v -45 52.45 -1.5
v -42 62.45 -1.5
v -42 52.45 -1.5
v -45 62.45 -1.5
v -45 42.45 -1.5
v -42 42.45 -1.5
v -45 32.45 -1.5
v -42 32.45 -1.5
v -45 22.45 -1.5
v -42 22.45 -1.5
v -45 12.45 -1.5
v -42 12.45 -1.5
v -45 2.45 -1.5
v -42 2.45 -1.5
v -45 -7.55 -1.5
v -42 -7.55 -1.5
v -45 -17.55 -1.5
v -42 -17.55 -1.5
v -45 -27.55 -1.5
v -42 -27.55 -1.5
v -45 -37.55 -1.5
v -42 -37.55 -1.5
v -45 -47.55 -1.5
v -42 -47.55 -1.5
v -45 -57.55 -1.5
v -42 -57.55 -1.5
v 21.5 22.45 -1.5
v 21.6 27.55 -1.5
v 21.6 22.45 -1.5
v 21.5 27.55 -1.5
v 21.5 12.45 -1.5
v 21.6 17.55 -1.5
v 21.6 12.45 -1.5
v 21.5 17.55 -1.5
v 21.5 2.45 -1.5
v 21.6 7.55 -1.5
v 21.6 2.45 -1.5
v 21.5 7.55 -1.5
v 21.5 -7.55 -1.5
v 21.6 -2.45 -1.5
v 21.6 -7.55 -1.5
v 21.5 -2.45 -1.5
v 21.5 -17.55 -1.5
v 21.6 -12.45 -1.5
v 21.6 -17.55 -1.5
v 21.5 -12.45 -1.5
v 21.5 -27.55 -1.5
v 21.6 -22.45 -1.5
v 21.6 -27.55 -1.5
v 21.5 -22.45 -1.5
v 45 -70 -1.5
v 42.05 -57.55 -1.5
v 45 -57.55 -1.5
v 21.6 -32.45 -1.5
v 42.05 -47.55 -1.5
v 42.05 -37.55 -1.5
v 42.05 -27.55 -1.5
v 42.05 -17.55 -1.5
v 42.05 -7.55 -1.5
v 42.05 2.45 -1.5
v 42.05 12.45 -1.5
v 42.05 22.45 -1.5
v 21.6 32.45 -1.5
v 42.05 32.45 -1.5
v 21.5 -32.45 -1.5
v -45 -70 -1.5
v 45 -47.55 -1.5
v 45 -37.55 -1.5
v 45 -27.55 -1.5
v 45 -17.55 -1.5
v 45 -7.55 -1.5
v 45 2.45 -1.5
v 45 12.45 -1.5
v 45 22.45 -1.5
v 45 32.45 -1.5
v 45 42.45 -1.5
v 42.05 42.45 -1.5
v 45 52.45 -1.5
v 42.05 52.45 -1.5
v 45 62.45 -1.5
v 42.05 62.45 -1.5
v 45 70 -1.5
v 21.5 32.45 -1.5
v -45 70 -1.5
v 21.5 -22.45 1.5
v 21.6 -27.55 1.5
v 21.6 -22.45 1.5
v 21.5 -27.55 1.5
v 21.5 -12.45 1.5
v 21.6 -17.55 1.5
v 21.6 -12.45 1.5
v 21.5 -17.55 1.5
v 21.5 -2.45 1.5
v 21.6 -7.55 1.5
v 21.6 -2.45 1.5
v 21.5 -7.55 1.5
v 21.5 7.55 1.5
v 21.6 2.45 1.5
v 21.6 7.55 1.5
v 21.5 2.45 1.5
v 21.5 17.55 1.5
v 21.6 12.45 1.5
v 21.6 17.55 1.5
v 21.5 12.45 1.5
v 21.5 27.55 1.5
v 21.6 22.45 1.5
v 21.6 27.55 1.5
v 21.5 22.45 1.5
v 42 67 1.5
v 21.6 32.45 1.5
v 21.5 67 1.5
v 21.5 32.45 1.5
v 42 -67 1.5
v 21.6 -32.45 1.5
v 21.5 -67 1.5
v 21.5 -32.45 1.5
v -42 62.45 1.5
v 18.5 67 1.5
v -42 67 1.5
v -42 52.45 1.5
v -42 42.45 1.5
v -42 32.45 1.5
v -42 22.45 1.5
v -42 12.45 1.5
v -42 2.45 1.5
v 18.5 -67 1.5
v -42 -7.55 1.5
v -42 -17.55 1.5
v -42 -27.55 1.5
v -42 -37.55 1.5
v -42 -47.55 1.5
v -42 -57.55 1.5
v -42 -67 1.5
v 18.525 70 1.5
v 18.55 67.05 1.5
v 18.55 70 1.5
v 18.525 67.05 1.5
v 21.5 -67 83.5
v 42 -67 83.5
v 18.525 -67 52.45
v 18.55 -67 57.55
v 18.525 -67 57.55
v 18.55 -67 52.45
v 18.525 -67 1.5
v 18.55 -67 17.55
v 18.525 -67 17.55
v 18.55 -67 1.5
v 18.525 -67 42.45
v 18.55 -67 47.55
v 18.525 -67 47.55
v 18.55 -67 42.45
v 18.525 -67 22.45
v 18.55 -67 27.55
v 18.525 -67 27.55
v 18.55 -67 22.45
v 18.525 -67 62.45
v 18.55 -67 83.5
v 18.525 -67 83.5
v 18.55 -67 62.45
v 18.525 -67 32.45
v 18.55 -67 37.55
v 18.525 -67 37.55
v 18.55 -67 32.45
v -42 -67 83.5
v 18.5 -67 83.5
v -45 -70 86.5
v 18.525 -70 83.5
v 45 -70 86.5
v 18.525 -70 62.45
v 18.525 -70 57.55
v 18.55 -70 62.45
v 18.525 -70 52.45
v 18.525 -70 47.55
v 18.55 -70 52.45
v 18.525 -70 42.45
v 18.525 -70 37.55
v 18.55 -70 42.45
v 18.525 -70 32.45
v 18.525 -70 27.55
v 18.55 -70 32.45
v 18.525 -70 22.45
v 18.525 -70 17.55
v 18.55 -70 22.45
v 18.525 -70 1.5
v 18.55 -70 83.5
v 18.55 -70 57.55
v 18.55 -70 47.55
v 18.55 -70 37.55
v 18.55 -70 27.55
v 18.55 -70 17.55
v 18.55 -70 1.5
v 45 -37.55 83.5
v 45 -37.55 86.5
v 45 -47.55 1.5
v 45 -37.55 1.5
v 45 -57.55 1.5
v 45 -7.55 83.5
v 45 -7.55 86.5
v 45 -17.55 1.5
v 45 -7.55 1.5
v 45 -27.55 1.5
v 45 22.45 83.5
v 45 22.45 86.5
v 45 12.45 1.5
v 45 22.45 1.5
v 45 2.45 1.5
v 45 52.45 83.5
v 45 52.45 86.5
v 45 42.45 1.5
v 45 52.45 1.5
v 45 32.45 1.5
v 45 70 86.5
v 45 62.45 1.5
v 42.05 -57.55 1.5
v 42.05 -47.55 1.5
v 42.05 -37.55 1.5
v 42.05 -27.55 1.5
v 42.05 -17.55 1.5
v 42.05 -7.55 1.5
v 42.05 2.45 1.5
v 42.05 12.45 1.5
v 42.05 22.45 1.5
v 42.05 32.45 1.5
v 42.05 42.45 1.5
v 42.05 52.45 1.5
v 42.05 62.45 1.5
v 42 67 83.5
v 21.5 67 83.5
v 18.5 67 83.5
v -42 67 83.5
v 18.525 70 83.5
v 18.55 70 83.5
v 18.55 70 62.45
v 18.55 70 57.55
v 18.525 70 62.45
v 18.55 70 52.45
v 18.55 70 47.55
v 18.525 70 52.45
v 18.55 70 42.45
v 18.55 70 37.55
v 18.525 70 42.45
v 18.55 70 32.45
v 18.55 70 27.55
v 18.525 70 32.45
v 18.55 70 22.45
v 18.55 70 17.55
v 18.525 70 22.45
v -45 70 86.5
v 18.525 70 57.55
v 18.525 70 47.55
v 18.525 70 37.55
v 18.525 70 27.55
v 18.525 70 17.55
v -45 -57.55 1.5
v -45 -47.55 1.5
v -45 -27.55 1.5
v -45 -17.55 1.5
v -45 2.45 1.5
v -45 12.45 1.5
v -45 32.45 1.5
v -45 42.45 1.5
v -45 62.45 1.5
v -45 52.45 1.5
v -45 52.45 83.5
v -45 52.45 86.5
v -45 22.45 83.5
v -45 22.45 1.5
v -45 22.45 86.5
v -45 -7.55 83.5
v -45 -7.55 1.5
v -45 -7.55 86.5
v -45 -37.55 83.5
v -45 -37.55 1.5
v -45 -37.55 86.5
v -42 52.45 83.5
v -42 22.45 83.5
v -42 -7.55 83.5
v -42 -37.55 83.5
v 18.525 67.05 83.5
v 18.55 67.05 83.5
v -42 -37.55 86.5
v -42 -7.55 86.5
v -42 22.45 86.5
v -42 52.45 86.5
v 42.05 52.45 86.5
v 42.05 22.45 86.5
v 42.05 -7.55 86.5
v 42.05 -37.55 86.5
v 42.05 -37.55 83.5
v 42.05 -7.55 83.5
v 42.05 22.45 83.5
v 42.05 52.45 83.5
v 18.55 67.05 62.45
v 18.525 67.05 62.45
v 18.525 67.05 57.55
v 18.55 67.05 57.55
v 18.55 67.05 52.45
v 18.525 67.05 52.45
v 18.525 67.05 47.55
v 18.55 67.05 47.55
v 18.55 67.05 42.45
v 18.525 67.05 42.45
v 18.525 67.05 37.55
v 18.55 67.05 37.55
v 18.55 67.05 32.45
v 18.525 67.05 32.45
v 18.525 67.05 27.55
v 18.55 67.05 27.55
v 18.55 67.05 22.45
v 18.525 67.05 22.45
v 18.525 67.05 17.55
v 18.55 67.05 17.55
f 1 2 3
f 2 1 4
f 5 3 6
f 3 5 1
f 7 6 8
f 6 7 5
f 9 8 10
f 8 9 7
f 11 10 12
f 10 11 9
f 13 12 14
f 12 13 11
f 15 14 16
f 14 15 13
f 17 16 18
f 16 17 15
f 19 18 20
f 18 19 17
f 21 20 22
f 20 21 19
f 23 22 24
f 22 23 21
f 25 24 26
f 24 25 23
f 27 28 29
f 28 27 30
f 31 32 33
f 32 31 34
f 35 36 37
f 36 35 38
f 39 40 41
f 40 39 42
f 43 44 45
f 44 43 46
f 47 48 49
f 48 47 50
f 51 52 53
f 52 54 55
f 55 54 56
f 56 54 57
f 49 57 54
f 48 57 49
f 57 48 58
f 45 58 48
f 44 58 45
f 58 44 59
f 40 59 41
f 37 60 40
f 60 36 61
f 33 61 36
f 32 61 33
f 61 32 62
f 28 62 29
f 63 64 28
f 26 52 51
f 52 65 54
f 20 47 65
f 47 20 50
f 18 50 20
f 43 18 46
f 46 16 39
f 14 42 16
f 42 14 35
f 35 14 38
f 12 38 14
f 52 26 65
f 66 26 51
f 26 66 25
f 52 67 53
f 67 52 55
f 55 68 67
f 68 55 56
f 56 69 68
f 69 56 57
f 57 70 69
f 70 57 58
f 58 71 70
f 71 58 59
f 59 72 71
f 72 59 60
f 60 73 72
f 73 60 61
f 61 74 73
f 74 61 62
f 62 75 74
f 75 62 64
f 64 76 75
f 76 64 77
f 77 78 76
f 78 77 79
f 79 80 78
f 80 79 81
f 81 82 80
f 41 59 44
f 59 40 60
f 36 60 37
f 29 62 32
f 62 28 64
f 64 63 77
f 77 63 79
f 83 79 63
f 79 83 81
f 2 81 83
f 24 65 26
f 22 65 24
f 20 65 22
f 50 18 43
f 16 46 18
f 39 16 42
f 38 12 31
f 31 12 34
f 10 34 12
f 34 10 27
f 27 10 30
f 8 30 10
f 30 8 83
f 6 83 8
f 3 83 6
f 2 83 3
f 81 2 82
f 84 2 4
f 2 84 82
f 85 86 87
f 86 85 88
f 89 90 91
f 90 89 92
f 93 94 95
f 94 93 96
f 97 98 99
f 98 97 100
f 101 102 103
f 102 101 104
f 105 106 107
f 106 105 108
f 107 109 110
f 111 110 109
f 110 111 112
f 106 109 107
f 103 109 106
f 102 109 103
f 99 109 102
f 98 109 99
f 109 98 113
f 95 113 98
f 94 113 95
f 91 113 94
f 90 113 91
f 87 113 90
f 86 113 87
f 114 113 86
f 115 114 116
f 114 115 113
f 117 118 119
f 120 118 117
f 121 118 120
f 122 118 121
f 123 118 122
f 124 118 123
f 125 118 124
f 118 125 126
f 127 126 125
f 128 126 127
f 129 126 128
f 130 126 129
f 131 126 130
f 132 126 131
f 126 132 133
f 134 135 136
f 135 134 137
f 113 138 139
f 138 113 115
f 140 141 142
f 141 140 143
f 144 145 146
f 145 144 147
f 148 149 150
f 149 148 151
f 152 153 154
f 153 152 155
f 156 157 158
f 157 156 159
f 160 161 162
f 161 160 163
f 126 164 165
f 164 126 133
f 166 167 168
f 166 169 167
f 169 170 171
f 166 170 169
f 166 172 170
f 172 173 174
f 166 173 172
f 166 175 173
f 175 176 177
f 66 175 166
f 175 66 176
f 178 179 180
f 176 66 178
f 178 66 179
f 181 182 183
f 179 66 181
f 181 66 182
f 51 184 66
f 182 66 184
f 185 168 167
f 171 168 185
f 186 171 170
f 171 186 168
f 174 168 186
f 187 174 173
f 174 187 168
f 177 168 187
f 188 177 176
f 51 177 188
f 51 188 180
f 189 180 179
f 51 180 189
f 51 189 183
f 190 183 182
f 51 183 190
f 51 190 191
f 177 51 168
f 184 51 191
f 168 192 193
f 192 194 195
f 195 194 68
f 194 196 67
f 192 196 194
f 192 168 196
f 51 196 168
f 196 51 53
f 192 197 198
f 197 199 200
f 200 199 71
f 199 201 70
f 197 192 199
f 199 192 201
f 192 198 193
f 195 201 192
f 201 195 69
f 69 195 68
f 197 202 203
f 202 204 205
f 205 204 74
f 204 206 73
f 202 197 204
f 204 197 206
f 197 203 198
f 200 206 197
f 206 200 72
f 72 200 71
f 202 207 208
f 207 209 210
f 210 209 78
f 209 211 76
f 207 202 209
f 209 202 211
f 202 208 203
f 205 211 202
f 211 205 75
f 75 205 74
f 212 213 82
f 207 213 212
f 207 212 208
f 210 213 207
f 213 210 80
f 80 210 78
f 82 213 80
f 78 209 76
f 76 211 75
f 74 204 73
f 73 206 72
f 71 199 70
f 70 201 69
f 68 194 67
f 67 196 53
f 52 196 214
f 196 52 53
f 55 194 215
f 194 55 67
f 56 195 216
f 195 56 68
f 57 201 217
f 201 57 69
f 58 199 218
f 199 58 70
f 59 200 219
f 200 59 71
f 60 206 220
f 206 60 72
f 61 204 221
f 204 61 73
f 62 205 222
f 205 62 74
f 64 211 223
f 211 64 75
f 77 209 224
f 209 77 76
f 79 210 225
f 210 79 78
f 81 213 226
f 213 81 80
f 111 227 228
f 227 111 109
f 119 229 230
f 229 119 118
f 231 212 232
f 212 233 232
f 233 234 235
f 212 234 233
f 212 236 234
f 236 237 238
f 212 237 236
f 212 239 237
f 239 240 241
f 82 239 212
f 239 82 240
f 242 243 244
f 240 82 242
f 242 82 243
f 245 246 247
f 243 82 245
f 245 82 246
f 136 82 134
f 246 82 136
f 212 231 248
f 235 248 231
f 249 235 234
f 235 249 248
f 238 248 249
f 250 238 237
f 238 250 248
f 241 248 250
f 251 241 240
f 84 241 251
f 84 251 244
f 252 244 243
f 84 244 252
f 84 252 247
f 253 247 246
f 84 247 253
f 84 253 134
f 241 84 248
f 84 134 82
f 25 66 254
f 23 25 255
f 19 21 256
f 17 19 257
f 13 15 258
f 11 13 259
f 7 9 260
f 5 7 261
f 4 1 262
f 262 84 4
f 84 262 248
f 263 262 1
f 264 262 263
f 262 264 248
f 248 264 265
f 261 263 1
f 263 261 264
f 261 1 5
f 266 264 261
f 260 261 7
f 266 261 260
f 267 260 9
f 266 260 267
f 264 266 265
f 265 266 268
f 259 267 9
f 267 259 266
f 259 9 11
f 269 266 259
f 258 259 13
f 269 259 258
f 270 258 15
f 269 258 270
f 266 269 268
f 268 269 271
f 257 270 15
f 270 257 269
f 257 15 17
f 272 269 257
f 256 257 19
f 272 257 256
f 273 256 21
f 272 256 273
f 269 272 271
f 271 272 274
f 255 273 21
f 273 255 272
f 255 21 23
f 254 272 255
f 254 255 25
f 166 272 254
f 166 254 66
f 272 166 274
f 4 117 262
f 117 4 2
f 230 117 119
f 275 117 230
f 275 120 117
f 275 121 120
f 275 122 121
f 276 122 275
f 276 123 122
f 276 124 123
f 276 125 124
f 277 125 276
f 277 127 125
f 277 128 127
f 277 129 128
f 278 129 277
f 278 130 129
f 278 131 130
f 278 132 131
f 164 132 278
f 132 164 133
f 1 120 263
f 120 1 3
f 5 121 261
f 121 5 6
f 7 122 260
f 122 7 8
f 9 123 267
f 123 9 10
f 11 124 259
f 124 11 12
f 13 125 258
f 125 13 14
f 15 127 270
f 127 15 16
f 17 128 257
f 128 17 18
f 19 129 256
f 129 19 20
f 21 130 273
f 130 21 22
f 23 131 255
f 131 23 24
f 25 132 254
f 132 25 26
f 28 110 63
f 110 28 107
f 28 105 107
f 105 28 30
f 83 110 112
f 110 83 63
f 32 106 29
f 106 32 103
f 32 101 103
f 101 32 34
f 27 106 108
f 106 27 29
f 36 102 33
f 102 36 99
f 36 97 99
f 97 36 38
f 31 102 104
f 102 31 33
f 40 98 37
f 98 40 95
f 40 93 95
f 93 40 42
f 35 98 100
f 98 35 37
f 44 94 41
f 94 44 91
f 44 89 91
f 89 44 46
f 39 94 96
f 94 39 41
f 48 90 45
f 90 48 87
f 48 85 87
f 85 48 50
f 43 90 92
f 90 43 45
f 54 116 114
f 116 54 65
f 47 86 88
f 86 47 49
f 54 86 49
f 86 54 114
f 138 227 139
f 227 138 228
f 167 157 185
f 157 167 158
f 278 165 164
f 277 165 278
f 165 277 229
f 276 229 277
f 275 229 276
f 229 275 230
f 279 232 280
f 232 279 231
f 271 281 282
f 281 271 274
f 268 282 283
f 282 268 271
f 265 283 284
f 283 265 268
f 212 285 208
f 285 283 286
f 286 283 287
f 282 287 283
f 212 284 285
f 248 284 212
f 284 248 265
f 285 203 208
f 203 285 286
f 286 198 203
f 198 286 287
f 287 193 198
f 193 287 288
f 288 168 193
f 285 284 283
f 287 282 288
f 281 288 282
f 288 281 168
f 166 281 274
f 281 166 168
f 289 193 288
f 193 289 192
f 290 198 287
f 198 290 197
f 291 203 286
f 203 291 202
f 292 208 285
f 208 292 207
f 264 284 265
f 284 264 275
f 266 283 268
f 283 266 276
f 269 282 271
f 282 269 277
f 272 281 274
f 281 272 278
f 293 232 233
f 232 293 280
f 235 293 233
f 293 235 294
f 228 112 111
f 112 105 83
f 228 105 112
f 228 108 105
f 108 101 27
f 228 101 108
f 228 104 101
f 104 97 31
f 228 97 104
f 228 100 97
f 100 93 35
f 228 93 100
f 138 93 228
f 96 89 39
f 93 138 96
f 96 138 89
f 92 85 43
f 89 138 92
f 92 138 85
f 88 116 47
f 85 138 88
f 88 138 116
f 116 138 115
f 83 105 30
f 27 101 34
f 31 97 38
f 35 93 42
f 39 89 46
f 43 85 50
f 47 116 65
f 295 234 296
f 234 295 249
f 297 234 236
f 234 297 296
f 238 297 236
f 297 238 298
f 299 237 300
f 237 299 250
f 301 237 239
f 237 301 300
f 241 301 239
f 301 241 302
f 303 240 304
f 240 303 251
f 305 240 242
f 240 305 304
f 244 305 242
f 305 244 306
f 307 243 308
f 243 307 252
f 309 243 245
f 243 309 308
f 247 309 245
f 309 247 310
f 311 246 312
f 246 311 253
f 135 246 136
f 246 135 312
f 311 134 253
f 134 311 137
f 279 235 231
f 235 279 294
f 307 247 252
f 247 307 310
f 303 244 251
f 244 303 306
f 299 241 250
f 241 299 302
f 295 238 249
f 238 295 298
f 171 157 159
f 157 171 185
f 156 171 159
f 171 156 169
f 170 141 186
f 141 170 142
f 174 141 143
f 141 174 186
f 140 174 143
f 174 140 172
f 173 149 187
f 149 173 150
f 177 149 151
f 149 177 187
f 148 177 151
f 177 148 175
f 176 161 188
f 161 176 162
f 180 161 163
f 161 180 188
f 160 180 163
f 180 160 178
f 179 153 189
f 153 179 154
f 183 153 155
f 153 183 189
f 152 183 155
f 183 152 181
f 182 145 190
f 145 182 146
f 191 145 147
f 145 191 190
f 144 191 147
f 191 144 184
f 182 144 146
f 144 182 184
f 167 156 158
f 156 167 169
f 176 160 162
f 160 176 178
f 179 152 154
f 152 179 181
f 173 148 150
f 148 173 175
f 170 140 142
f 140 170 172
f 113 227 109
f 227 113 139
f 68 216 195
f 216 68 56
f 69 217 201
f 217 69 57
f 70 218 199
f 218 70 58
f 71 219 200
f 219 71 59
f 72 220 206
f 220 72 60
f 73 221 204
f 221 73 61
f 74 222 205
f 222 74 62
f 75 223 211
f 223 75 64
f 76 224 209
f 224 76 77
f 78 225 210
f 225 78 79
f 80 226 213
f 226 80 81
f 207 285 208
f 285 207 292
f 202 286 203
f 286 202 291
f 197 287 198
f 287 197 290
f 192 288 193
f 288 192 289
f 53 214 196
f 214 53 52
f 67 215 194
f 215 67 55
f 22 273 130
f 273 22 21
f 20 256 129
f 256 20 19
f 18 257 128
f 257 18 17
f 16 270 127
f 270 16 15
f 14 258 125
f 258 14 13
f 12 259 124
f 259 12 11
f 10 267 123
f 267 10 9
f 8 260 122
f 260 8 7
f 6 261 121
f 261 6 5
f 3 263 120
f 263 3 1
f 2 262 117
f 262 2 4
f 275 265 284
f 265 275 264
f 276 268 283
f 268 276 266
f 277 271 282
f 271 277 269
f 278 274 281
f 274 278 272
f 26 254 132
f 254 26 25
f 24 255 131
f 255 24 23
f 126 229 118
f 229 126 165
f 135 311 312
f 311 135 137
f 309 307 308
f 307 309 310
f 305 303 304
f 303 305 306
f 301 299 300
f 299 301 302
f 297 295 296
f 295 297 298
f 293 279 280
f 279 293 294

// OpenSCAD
/*
Create a laser cut box with finger joints
Released under the Creative Commons Attribution License
Some Rights Reserved: aaron . ciuffo 2 gmail.com

Version 2.6 05 November 2015
  * added lid hole
  * TODO: check kerf calculations

Version 2.5 18 September 2014
  * merged changes from 2.4 to allow different cut width on lid

Version 2.4 15 September 2014
  * variable cut width on lid
  * implementation is broken because uDiv is calculated from cutW, not cutWlid

Version 2.3 15 September 2014
  * partial rewrite of modules to make more parametric

*/

/* [Box OUTSIDE Dimensions] */
//Box Width (X)
bX=90;
//Box Depth (Y)
bY=140;
//Box Height (Z)
bZ=88;
//Material Thickness
cutD=3;
//include a lid?
addLid=1; //[1:Lid, 0:No Lid]
//Finger Hole Diameter
holeDia=0; //[0:50]


/*[Inside Supports]*/
//X Location - from origin
supXpos=20;

/* [Finger Width] */
//Finger  width (cutW < 1/3 shortest side)
cutW=5;//[3:20]
//Finger width on lid (cutWlid < 1/3 shorter of X/Y dimension)
cutWlid=15;//[3:30]
//Laser kerf (1/2 inside, 1/2 outside of laser path)
kerf=0.1;

/* [Layout] */
//separation of finished pieces
separation=1;
//transparency of 3D model
alpha=70; //[1:100]
//2D or 3D Layout
2D=0; //[1:2D for DXF, 0:3D for STL]



/* [Hidden] */
//Calculate the maximum number of tabs and slots
maxDivX=floor(bX/cutW);
maxDivY=floor(bY/cutW);
maxDivZ=floor(bZ/cutW);

//NB! the maximum usable divisions MUST be odd
uDivX= (maxDivX%2)==0 ? maxDivX-3 : maxDivX-2;
uDivY= (maxDivY%2)==0 ? maxDivY-3 : maxDivY-2;
uDivZ= (maxDivZ%2)==0 ? maxDivZ-3 : maxDivZ-2;

alp=1-alpha/100;

//cuts that fall completely insde the edges
module insideCuts(len, cutWidth, cutDepth, uDiv, lKerf=0.1) {

  //Calculate the number of tabs and slots
  numTabs=floor(uDiv/2);
  numSlots=ceil(uDiv/2);

  //draw out rectangles for slots
  for (i=[0:numSlots-1]) {
    translate([i*(cutWidth*2)+lKerf/2, 0, 0])
      square([cutWidth-lKerf, cutDepth]);
  }
}


//cuts that fall at the end of an edge
module outsideCuts(len, cutWidth, cutDepth, uDiv, lKerf=0.1, endCut) {

  numSlots=floor(uDiv/2);

  //padding - shift all the slots by the amount equal to the end cut plus one division
  padding=endCut+cutWidth;

  //first endcut - remove the bit of edge that falls outside the normal finger
  // joints
  square([endCut+lKerf/2, cutD]);

  //draw all the normal slots plus the last endcut
  for (i=[0:numSlots]) {
    if (i < numSlots) {
      translate([i*(cutWidth*2)+padding-lKerf/2, 0, 0])
        square([cutWidth+lKerf, cutDepth]);
    } else {
      //last endCut 
      translate([i*(cutWidth*2)+padding-lKerf/2, 0, 0])
        square([endCut+lKerf/2, cutDepth]);
    }
  }
 }


//Face A (X and Z dimension)
//Front and Back face
//uDiv - usable divisions, uDivLX - usable divisions on the Lid
module faceA(uDivX, uDivY, uDivZ, uDivLX) {
  difference() {
    square([bX, bZ], center=true);
    //X+/- edge (X axis in OpenSCAD)
    // if true, make cuts for the lid
    if (addLid) {
      //translate([-uDivX*cutW/2, bZ/2-cutD, 0])
      //  insideCuts(len=bX, cutWidth=cutW, cutDepth=cutD, uDiv=uDivX, lKerf=kerf);
      translate([-uDivLX*cutWlid/2, bZ/2-cutD, 0])
        insideCuts(len=bX, cutWidth=cutWlid, cutDepth=cutD, uDiv=uDivLX, lKerf=kerf);
    }
    translate([-uDivX*cutW/2, -bZ/2, 0])
      insideCuts(len=bX, cutWidth=cutW, cutDepth=cutD, uDiv=uDivX, lKerf=kerf);

    //Z+/- edge (Y axis in OpenSCAD)
    translate([bX/2-cutD+kerf/2, uDivZ*cutW/2, 0]) rotate([0, 0, -90])
      insideCuts(len=bZ, cutWidth=cutW, cutDepth=cutD, uDiv=uDivZ, lKerf=kerf);
    translate([-bX/2, uDivZ*cutW/2, 0]) rotate([0, 0, -90])
      insideCuts(len=bZ, cutWidth=cutW, cutDepth=cutD, uDiv=uDivZ, lKerf=kerf);

    translate([-bY/2+cutD/2+supXpos, 0, 0])
      internalSupport(uDivY, uDivZ, uDivLX, Zcutter=1);

  }
}

//Face B (X and Y dimension)
//create the lid and base
module faceB(uDivX, uDivY, uDivLX, uDivLY, lid=0) {

  
  //if this is the "lid" use cutWlid dimensions instead of cutW
  // create the local version of these variables

  uDivXloc= lid==1 ? uDivLX : uDivX;
  uDivYloc= lid==1 ? uDivLY : uDivY;
  cutWloc=  lid==1 ? cutWlid : cutW;
  lidHoleloc= lid==1 ? holeDia/2 : 0;

  //endCut = remaning edge after fingers have been made; this will 
  // be removed leaving an extra wide finger/slot
  endCutX=(bX-uDivXloc*cutWloc)/2;


  difference() {
    square([bX, bY], center=true);
    //X+/- edge (X axis in OpenSCAD)
    translate([(-uDivXloc*cutWloc/2)-endCutX, bY/2-cutD, 0])
    //Original: #translate([(-uDivX*cutW/2)-endCutX, bY/2-cutD+kerf/2, 0])
      outsideCuts(len=bX, cutWidth=cutWloc, cutDepth=cutD, uDiv=uDivXloc,
        lKerf=kerf, endCut=endCutX);
    translate([(-uDivXloc*cutWloc/2)-endCutX, -bY/2, 0])
      outsideCuts(len=bX, cutWidth=cutWloc, cutDepth=cutD, uDiv=uDivXloc,
        lKerf=kerf, endCut=endCutX);
    
    circle(r=lidHoleloc);

    //Y+/- edge (Y axis in OpenSCAD)
    translate([bX/2-cutD+kerf/2, uDivYloc*cutWloc/2, 0]) rotate([0, 0, -90])
      insideCuts(len=bY, cutWidth=cutWloc, cutDepth=cutD, uDiv=uDivYloc, lKerf=kerf);
    translate([-bX/2, uDivYloc*cutWloc/2, 0]) rotate([0, 0, -90])
      insideCuts(len=bY, cutWidth=cutWloc, cutDepth=cutD, uDiv=uDivYloc, lKerf=kerf);
    if (lid==0) { 
      translate([-bX/2+cutD-kerf*4+supXpos, 0, 0]) rotate([0, 0, 90])
        internalSupport(uDivY, uDivZ, uDivLX, Ycutter=1);
    }

  }
}


module faceC(uDivY, uDivZ, uDivLY) {
  //amount to cut off at the end of an outside cut edge
  endCutY=(bY-uDivY*cutW)/2;
  endCutZ=(bZ-uDivZ*cutW)/2;
  endCutLY=(bY-uDivLY*cutWlid)/2;

  difference() {
      square([bY, bZ], center=true);
      //Y+/- edge (X axis in OpenSCAD)
      if(addLid) {
        translate([(-uDivLY*cutWlid/2)-endCutLY, bZ/2-cutD, 0])
          outsideCuts(len=bY, cutWidth=cutWlid, cutDepth=cutD, uDiv=uDivLY, lKerf=kerf,
            endCut=endCutLY);
      }
      translate([(-uDivY*cutW/2)-endCutY, -bZ/2, 0])
        outsideCuts(len=bY, cutWidth=cutW, cutDepth=cutD, uDiv=uDivY, lKerf=kerf,
          endCut=endCutY);

      //Z+/- edge (Y axis in OpenSCAD)
      translate([-bY/2, (uDivZ*cutW/2)+endCutZ, 0]) rotate([0, 0, -90])
        outsideCuts(len=bZ, cutWidth=cutW, cutDepth=cutD, uDiv=uDivZ, lKerf=kerf,
          endCut=endCutZ);
      translate([bY/2-cutD+kerf/2, (uDivZ*cutW/2)+endCutZ, 0]) rotate([0, 0, -90])
        outsideCuts(len=bZ, cutWidth=cutW, cutDepth=cutD, uDiv=uDivZ, lKerf=kerf,
          endCut=endCutZ);
    }
}

module internalSupport(uDivY, uDivZ, uDivLY, Ycutter=0, Zcutter=0) {
  //decrease the usable divisions by dividing to improve strength of face 
  uDivZloc=ceil(uDivZ/2);
  uDivYloc=ceil(uDivY/2);

  difference() {
    faceC(uDivYloc, uDivZloc, uDivLY);
    translate([0, bZ/2-cutD/2, 0])
      square([bY, cutD], center=true);
   //if this is to be used as a cutter cut off everything other than the cutting bit
   if (Ycutter==1) {
    translate([0, cutD, 0])
      square([bY, bZ], center=true);
   }
   if (Zcutter==1) {
    translate([-cutD/2, 0, 0])
      square([bY-cutD+kerf/2, bZ], center=true);
   }
  }
}

module layout2D(uDivX, uDivY, uDivZ, uDivLX, uDivLY) {
  translate()
    color("orange") faceA(uDivX, uDivY, uDivZ, uDivLX); 


  if (addLid) {
  translate([0, -bZ/2-bY/2-separation, 0])
    color("green") faceB(uDivX, uDivY, uDivLX, uDivLY, lid=1);
  }
  
  translate([bX/2+bY/2+separation, 0, 0])
    color("blue") faceC(uDivY, uDivZ, uDivLY);

  translate([bX+separation+bY+separation, 0, 0])
    color("darkred") faceA(uDivX, uDivY, uDivZ, uDivLX);
  
  translate([bX/2+bY/2+separation, -bY, 0])
    color("navy") faceC(uDivY, uDivZ, uDivLY);

  translate([bX+separation+bY+separation, -bZ/2-bY/2-separation, 0])
    color("lime") faceB(uDivX, uDivY, lid=0);

  translate([bX/2+bY/2+separation, -bY-bZ-separation, 0])
    color("olive") internalSupport(uDivY, uDivZ, uDivLY);
}


module assemble3D(DivX, uDivY, uDivZ, uDivLX, uDivLY, alp=0.5) {
  //amount to shift for cut depth
  D=cutD/2;

  //bottom of box (B-)
  color("lime", alpha=alp)
    linear_extrude(height=cutD, center=true) faceB(uDivX, uDivY, lid=0);

  //lid of box (B+)
  
  if (addLid) {
  color("green", alpha=alp)
    translate([0, 0, bZ-cutD])
    linear_extrude(height=cutD, center=true) faceB(uDivX, uDivY, uDivLX, uDivLY, lid=1);
  }

  //faceA +/-
  color("red", alpha=alp)
    translate([0, bY/2-D, bZ/2-D]) rotate([90, 0, 0])
    linear_extrude(height=cutD, center=true) faceA(uDivX, uDivY, uDivZ, uDivLX);
  color("darkred", alpha=alp)
    translate([0, -bY/2+D, bZ/2-D]) rotate([90, 0, 0])
    linear_extrude(height=cutD, center=true) faceA(uDivX, uDivY, uDivZ, uDivLX);

  //FaceC +/-
  color("blue", alpha=alp)
    translate([bX/2-D, 0, bZ/2-D]) rotate([90, 0, 90])
    linear_extrude(height=cutD, center=true) faceC(uDivY, uDivZ, uDivLY);
  
  color("navy", alpha=alp)
    translate([-bX/2+D, 0, bZ/2-D]) rotate([90, 0, 90])
    linear_extrude(height=cutD, center=true) faceC(uDivY, uDivZ, uDivLY);

    
  color("olive", alpha=1)
    translate([supXpos, 0, bZ/2-D]) rotate([90, 0, 90])
    linear_extrude(height=cutD, center=true) internalSupport(uDivY, uDivZ, uDivLY);

}

module main() {
  //Calculate the maximum number of tabs and slots
  maxDivX=floor(bX/cutW);
  maxDivY=floor(bY/cutW);
  maxDivZ=floor(bZ/cutW);

  // calculate the maximum number of tabs for the lid cut width
  maxDivLX=floor(bX/cutWlid);
  maxDivLY=floor(bY/cutWlid);

  //Usable divisions on the X, Y, Z edges
  //NB! the maximum usable divisions MUST be odd
  uDivX= (maxDivX%2)==0 ? maxDivX-3 : maxDivX-2;
  uDivY= (maxDivY%2)==0 ? maxDivY-3 : maxDivY-2;
  uDivZ= (maxDivZ%2)==0 ? maxDivZ-3 : maxDivZ-2;

  uDivLX= (maxDivLX%2)==0 ? maxDivLX-3 : maxDivLX-2;
  uDivLY= (maxDivLY%2)==0 ? maxDivLY-3 : maxDivLY-2;


  alp=1-alpha/100;

  if (2D) {
    layout2D(uDivX, uDivY, uDivZ, uDivLX, uDivLY); 
  } else {
    assemble3D(uDivX, uDivY, uDivZ, uDivLX, uDivLY, alp);
  }
}


main();
